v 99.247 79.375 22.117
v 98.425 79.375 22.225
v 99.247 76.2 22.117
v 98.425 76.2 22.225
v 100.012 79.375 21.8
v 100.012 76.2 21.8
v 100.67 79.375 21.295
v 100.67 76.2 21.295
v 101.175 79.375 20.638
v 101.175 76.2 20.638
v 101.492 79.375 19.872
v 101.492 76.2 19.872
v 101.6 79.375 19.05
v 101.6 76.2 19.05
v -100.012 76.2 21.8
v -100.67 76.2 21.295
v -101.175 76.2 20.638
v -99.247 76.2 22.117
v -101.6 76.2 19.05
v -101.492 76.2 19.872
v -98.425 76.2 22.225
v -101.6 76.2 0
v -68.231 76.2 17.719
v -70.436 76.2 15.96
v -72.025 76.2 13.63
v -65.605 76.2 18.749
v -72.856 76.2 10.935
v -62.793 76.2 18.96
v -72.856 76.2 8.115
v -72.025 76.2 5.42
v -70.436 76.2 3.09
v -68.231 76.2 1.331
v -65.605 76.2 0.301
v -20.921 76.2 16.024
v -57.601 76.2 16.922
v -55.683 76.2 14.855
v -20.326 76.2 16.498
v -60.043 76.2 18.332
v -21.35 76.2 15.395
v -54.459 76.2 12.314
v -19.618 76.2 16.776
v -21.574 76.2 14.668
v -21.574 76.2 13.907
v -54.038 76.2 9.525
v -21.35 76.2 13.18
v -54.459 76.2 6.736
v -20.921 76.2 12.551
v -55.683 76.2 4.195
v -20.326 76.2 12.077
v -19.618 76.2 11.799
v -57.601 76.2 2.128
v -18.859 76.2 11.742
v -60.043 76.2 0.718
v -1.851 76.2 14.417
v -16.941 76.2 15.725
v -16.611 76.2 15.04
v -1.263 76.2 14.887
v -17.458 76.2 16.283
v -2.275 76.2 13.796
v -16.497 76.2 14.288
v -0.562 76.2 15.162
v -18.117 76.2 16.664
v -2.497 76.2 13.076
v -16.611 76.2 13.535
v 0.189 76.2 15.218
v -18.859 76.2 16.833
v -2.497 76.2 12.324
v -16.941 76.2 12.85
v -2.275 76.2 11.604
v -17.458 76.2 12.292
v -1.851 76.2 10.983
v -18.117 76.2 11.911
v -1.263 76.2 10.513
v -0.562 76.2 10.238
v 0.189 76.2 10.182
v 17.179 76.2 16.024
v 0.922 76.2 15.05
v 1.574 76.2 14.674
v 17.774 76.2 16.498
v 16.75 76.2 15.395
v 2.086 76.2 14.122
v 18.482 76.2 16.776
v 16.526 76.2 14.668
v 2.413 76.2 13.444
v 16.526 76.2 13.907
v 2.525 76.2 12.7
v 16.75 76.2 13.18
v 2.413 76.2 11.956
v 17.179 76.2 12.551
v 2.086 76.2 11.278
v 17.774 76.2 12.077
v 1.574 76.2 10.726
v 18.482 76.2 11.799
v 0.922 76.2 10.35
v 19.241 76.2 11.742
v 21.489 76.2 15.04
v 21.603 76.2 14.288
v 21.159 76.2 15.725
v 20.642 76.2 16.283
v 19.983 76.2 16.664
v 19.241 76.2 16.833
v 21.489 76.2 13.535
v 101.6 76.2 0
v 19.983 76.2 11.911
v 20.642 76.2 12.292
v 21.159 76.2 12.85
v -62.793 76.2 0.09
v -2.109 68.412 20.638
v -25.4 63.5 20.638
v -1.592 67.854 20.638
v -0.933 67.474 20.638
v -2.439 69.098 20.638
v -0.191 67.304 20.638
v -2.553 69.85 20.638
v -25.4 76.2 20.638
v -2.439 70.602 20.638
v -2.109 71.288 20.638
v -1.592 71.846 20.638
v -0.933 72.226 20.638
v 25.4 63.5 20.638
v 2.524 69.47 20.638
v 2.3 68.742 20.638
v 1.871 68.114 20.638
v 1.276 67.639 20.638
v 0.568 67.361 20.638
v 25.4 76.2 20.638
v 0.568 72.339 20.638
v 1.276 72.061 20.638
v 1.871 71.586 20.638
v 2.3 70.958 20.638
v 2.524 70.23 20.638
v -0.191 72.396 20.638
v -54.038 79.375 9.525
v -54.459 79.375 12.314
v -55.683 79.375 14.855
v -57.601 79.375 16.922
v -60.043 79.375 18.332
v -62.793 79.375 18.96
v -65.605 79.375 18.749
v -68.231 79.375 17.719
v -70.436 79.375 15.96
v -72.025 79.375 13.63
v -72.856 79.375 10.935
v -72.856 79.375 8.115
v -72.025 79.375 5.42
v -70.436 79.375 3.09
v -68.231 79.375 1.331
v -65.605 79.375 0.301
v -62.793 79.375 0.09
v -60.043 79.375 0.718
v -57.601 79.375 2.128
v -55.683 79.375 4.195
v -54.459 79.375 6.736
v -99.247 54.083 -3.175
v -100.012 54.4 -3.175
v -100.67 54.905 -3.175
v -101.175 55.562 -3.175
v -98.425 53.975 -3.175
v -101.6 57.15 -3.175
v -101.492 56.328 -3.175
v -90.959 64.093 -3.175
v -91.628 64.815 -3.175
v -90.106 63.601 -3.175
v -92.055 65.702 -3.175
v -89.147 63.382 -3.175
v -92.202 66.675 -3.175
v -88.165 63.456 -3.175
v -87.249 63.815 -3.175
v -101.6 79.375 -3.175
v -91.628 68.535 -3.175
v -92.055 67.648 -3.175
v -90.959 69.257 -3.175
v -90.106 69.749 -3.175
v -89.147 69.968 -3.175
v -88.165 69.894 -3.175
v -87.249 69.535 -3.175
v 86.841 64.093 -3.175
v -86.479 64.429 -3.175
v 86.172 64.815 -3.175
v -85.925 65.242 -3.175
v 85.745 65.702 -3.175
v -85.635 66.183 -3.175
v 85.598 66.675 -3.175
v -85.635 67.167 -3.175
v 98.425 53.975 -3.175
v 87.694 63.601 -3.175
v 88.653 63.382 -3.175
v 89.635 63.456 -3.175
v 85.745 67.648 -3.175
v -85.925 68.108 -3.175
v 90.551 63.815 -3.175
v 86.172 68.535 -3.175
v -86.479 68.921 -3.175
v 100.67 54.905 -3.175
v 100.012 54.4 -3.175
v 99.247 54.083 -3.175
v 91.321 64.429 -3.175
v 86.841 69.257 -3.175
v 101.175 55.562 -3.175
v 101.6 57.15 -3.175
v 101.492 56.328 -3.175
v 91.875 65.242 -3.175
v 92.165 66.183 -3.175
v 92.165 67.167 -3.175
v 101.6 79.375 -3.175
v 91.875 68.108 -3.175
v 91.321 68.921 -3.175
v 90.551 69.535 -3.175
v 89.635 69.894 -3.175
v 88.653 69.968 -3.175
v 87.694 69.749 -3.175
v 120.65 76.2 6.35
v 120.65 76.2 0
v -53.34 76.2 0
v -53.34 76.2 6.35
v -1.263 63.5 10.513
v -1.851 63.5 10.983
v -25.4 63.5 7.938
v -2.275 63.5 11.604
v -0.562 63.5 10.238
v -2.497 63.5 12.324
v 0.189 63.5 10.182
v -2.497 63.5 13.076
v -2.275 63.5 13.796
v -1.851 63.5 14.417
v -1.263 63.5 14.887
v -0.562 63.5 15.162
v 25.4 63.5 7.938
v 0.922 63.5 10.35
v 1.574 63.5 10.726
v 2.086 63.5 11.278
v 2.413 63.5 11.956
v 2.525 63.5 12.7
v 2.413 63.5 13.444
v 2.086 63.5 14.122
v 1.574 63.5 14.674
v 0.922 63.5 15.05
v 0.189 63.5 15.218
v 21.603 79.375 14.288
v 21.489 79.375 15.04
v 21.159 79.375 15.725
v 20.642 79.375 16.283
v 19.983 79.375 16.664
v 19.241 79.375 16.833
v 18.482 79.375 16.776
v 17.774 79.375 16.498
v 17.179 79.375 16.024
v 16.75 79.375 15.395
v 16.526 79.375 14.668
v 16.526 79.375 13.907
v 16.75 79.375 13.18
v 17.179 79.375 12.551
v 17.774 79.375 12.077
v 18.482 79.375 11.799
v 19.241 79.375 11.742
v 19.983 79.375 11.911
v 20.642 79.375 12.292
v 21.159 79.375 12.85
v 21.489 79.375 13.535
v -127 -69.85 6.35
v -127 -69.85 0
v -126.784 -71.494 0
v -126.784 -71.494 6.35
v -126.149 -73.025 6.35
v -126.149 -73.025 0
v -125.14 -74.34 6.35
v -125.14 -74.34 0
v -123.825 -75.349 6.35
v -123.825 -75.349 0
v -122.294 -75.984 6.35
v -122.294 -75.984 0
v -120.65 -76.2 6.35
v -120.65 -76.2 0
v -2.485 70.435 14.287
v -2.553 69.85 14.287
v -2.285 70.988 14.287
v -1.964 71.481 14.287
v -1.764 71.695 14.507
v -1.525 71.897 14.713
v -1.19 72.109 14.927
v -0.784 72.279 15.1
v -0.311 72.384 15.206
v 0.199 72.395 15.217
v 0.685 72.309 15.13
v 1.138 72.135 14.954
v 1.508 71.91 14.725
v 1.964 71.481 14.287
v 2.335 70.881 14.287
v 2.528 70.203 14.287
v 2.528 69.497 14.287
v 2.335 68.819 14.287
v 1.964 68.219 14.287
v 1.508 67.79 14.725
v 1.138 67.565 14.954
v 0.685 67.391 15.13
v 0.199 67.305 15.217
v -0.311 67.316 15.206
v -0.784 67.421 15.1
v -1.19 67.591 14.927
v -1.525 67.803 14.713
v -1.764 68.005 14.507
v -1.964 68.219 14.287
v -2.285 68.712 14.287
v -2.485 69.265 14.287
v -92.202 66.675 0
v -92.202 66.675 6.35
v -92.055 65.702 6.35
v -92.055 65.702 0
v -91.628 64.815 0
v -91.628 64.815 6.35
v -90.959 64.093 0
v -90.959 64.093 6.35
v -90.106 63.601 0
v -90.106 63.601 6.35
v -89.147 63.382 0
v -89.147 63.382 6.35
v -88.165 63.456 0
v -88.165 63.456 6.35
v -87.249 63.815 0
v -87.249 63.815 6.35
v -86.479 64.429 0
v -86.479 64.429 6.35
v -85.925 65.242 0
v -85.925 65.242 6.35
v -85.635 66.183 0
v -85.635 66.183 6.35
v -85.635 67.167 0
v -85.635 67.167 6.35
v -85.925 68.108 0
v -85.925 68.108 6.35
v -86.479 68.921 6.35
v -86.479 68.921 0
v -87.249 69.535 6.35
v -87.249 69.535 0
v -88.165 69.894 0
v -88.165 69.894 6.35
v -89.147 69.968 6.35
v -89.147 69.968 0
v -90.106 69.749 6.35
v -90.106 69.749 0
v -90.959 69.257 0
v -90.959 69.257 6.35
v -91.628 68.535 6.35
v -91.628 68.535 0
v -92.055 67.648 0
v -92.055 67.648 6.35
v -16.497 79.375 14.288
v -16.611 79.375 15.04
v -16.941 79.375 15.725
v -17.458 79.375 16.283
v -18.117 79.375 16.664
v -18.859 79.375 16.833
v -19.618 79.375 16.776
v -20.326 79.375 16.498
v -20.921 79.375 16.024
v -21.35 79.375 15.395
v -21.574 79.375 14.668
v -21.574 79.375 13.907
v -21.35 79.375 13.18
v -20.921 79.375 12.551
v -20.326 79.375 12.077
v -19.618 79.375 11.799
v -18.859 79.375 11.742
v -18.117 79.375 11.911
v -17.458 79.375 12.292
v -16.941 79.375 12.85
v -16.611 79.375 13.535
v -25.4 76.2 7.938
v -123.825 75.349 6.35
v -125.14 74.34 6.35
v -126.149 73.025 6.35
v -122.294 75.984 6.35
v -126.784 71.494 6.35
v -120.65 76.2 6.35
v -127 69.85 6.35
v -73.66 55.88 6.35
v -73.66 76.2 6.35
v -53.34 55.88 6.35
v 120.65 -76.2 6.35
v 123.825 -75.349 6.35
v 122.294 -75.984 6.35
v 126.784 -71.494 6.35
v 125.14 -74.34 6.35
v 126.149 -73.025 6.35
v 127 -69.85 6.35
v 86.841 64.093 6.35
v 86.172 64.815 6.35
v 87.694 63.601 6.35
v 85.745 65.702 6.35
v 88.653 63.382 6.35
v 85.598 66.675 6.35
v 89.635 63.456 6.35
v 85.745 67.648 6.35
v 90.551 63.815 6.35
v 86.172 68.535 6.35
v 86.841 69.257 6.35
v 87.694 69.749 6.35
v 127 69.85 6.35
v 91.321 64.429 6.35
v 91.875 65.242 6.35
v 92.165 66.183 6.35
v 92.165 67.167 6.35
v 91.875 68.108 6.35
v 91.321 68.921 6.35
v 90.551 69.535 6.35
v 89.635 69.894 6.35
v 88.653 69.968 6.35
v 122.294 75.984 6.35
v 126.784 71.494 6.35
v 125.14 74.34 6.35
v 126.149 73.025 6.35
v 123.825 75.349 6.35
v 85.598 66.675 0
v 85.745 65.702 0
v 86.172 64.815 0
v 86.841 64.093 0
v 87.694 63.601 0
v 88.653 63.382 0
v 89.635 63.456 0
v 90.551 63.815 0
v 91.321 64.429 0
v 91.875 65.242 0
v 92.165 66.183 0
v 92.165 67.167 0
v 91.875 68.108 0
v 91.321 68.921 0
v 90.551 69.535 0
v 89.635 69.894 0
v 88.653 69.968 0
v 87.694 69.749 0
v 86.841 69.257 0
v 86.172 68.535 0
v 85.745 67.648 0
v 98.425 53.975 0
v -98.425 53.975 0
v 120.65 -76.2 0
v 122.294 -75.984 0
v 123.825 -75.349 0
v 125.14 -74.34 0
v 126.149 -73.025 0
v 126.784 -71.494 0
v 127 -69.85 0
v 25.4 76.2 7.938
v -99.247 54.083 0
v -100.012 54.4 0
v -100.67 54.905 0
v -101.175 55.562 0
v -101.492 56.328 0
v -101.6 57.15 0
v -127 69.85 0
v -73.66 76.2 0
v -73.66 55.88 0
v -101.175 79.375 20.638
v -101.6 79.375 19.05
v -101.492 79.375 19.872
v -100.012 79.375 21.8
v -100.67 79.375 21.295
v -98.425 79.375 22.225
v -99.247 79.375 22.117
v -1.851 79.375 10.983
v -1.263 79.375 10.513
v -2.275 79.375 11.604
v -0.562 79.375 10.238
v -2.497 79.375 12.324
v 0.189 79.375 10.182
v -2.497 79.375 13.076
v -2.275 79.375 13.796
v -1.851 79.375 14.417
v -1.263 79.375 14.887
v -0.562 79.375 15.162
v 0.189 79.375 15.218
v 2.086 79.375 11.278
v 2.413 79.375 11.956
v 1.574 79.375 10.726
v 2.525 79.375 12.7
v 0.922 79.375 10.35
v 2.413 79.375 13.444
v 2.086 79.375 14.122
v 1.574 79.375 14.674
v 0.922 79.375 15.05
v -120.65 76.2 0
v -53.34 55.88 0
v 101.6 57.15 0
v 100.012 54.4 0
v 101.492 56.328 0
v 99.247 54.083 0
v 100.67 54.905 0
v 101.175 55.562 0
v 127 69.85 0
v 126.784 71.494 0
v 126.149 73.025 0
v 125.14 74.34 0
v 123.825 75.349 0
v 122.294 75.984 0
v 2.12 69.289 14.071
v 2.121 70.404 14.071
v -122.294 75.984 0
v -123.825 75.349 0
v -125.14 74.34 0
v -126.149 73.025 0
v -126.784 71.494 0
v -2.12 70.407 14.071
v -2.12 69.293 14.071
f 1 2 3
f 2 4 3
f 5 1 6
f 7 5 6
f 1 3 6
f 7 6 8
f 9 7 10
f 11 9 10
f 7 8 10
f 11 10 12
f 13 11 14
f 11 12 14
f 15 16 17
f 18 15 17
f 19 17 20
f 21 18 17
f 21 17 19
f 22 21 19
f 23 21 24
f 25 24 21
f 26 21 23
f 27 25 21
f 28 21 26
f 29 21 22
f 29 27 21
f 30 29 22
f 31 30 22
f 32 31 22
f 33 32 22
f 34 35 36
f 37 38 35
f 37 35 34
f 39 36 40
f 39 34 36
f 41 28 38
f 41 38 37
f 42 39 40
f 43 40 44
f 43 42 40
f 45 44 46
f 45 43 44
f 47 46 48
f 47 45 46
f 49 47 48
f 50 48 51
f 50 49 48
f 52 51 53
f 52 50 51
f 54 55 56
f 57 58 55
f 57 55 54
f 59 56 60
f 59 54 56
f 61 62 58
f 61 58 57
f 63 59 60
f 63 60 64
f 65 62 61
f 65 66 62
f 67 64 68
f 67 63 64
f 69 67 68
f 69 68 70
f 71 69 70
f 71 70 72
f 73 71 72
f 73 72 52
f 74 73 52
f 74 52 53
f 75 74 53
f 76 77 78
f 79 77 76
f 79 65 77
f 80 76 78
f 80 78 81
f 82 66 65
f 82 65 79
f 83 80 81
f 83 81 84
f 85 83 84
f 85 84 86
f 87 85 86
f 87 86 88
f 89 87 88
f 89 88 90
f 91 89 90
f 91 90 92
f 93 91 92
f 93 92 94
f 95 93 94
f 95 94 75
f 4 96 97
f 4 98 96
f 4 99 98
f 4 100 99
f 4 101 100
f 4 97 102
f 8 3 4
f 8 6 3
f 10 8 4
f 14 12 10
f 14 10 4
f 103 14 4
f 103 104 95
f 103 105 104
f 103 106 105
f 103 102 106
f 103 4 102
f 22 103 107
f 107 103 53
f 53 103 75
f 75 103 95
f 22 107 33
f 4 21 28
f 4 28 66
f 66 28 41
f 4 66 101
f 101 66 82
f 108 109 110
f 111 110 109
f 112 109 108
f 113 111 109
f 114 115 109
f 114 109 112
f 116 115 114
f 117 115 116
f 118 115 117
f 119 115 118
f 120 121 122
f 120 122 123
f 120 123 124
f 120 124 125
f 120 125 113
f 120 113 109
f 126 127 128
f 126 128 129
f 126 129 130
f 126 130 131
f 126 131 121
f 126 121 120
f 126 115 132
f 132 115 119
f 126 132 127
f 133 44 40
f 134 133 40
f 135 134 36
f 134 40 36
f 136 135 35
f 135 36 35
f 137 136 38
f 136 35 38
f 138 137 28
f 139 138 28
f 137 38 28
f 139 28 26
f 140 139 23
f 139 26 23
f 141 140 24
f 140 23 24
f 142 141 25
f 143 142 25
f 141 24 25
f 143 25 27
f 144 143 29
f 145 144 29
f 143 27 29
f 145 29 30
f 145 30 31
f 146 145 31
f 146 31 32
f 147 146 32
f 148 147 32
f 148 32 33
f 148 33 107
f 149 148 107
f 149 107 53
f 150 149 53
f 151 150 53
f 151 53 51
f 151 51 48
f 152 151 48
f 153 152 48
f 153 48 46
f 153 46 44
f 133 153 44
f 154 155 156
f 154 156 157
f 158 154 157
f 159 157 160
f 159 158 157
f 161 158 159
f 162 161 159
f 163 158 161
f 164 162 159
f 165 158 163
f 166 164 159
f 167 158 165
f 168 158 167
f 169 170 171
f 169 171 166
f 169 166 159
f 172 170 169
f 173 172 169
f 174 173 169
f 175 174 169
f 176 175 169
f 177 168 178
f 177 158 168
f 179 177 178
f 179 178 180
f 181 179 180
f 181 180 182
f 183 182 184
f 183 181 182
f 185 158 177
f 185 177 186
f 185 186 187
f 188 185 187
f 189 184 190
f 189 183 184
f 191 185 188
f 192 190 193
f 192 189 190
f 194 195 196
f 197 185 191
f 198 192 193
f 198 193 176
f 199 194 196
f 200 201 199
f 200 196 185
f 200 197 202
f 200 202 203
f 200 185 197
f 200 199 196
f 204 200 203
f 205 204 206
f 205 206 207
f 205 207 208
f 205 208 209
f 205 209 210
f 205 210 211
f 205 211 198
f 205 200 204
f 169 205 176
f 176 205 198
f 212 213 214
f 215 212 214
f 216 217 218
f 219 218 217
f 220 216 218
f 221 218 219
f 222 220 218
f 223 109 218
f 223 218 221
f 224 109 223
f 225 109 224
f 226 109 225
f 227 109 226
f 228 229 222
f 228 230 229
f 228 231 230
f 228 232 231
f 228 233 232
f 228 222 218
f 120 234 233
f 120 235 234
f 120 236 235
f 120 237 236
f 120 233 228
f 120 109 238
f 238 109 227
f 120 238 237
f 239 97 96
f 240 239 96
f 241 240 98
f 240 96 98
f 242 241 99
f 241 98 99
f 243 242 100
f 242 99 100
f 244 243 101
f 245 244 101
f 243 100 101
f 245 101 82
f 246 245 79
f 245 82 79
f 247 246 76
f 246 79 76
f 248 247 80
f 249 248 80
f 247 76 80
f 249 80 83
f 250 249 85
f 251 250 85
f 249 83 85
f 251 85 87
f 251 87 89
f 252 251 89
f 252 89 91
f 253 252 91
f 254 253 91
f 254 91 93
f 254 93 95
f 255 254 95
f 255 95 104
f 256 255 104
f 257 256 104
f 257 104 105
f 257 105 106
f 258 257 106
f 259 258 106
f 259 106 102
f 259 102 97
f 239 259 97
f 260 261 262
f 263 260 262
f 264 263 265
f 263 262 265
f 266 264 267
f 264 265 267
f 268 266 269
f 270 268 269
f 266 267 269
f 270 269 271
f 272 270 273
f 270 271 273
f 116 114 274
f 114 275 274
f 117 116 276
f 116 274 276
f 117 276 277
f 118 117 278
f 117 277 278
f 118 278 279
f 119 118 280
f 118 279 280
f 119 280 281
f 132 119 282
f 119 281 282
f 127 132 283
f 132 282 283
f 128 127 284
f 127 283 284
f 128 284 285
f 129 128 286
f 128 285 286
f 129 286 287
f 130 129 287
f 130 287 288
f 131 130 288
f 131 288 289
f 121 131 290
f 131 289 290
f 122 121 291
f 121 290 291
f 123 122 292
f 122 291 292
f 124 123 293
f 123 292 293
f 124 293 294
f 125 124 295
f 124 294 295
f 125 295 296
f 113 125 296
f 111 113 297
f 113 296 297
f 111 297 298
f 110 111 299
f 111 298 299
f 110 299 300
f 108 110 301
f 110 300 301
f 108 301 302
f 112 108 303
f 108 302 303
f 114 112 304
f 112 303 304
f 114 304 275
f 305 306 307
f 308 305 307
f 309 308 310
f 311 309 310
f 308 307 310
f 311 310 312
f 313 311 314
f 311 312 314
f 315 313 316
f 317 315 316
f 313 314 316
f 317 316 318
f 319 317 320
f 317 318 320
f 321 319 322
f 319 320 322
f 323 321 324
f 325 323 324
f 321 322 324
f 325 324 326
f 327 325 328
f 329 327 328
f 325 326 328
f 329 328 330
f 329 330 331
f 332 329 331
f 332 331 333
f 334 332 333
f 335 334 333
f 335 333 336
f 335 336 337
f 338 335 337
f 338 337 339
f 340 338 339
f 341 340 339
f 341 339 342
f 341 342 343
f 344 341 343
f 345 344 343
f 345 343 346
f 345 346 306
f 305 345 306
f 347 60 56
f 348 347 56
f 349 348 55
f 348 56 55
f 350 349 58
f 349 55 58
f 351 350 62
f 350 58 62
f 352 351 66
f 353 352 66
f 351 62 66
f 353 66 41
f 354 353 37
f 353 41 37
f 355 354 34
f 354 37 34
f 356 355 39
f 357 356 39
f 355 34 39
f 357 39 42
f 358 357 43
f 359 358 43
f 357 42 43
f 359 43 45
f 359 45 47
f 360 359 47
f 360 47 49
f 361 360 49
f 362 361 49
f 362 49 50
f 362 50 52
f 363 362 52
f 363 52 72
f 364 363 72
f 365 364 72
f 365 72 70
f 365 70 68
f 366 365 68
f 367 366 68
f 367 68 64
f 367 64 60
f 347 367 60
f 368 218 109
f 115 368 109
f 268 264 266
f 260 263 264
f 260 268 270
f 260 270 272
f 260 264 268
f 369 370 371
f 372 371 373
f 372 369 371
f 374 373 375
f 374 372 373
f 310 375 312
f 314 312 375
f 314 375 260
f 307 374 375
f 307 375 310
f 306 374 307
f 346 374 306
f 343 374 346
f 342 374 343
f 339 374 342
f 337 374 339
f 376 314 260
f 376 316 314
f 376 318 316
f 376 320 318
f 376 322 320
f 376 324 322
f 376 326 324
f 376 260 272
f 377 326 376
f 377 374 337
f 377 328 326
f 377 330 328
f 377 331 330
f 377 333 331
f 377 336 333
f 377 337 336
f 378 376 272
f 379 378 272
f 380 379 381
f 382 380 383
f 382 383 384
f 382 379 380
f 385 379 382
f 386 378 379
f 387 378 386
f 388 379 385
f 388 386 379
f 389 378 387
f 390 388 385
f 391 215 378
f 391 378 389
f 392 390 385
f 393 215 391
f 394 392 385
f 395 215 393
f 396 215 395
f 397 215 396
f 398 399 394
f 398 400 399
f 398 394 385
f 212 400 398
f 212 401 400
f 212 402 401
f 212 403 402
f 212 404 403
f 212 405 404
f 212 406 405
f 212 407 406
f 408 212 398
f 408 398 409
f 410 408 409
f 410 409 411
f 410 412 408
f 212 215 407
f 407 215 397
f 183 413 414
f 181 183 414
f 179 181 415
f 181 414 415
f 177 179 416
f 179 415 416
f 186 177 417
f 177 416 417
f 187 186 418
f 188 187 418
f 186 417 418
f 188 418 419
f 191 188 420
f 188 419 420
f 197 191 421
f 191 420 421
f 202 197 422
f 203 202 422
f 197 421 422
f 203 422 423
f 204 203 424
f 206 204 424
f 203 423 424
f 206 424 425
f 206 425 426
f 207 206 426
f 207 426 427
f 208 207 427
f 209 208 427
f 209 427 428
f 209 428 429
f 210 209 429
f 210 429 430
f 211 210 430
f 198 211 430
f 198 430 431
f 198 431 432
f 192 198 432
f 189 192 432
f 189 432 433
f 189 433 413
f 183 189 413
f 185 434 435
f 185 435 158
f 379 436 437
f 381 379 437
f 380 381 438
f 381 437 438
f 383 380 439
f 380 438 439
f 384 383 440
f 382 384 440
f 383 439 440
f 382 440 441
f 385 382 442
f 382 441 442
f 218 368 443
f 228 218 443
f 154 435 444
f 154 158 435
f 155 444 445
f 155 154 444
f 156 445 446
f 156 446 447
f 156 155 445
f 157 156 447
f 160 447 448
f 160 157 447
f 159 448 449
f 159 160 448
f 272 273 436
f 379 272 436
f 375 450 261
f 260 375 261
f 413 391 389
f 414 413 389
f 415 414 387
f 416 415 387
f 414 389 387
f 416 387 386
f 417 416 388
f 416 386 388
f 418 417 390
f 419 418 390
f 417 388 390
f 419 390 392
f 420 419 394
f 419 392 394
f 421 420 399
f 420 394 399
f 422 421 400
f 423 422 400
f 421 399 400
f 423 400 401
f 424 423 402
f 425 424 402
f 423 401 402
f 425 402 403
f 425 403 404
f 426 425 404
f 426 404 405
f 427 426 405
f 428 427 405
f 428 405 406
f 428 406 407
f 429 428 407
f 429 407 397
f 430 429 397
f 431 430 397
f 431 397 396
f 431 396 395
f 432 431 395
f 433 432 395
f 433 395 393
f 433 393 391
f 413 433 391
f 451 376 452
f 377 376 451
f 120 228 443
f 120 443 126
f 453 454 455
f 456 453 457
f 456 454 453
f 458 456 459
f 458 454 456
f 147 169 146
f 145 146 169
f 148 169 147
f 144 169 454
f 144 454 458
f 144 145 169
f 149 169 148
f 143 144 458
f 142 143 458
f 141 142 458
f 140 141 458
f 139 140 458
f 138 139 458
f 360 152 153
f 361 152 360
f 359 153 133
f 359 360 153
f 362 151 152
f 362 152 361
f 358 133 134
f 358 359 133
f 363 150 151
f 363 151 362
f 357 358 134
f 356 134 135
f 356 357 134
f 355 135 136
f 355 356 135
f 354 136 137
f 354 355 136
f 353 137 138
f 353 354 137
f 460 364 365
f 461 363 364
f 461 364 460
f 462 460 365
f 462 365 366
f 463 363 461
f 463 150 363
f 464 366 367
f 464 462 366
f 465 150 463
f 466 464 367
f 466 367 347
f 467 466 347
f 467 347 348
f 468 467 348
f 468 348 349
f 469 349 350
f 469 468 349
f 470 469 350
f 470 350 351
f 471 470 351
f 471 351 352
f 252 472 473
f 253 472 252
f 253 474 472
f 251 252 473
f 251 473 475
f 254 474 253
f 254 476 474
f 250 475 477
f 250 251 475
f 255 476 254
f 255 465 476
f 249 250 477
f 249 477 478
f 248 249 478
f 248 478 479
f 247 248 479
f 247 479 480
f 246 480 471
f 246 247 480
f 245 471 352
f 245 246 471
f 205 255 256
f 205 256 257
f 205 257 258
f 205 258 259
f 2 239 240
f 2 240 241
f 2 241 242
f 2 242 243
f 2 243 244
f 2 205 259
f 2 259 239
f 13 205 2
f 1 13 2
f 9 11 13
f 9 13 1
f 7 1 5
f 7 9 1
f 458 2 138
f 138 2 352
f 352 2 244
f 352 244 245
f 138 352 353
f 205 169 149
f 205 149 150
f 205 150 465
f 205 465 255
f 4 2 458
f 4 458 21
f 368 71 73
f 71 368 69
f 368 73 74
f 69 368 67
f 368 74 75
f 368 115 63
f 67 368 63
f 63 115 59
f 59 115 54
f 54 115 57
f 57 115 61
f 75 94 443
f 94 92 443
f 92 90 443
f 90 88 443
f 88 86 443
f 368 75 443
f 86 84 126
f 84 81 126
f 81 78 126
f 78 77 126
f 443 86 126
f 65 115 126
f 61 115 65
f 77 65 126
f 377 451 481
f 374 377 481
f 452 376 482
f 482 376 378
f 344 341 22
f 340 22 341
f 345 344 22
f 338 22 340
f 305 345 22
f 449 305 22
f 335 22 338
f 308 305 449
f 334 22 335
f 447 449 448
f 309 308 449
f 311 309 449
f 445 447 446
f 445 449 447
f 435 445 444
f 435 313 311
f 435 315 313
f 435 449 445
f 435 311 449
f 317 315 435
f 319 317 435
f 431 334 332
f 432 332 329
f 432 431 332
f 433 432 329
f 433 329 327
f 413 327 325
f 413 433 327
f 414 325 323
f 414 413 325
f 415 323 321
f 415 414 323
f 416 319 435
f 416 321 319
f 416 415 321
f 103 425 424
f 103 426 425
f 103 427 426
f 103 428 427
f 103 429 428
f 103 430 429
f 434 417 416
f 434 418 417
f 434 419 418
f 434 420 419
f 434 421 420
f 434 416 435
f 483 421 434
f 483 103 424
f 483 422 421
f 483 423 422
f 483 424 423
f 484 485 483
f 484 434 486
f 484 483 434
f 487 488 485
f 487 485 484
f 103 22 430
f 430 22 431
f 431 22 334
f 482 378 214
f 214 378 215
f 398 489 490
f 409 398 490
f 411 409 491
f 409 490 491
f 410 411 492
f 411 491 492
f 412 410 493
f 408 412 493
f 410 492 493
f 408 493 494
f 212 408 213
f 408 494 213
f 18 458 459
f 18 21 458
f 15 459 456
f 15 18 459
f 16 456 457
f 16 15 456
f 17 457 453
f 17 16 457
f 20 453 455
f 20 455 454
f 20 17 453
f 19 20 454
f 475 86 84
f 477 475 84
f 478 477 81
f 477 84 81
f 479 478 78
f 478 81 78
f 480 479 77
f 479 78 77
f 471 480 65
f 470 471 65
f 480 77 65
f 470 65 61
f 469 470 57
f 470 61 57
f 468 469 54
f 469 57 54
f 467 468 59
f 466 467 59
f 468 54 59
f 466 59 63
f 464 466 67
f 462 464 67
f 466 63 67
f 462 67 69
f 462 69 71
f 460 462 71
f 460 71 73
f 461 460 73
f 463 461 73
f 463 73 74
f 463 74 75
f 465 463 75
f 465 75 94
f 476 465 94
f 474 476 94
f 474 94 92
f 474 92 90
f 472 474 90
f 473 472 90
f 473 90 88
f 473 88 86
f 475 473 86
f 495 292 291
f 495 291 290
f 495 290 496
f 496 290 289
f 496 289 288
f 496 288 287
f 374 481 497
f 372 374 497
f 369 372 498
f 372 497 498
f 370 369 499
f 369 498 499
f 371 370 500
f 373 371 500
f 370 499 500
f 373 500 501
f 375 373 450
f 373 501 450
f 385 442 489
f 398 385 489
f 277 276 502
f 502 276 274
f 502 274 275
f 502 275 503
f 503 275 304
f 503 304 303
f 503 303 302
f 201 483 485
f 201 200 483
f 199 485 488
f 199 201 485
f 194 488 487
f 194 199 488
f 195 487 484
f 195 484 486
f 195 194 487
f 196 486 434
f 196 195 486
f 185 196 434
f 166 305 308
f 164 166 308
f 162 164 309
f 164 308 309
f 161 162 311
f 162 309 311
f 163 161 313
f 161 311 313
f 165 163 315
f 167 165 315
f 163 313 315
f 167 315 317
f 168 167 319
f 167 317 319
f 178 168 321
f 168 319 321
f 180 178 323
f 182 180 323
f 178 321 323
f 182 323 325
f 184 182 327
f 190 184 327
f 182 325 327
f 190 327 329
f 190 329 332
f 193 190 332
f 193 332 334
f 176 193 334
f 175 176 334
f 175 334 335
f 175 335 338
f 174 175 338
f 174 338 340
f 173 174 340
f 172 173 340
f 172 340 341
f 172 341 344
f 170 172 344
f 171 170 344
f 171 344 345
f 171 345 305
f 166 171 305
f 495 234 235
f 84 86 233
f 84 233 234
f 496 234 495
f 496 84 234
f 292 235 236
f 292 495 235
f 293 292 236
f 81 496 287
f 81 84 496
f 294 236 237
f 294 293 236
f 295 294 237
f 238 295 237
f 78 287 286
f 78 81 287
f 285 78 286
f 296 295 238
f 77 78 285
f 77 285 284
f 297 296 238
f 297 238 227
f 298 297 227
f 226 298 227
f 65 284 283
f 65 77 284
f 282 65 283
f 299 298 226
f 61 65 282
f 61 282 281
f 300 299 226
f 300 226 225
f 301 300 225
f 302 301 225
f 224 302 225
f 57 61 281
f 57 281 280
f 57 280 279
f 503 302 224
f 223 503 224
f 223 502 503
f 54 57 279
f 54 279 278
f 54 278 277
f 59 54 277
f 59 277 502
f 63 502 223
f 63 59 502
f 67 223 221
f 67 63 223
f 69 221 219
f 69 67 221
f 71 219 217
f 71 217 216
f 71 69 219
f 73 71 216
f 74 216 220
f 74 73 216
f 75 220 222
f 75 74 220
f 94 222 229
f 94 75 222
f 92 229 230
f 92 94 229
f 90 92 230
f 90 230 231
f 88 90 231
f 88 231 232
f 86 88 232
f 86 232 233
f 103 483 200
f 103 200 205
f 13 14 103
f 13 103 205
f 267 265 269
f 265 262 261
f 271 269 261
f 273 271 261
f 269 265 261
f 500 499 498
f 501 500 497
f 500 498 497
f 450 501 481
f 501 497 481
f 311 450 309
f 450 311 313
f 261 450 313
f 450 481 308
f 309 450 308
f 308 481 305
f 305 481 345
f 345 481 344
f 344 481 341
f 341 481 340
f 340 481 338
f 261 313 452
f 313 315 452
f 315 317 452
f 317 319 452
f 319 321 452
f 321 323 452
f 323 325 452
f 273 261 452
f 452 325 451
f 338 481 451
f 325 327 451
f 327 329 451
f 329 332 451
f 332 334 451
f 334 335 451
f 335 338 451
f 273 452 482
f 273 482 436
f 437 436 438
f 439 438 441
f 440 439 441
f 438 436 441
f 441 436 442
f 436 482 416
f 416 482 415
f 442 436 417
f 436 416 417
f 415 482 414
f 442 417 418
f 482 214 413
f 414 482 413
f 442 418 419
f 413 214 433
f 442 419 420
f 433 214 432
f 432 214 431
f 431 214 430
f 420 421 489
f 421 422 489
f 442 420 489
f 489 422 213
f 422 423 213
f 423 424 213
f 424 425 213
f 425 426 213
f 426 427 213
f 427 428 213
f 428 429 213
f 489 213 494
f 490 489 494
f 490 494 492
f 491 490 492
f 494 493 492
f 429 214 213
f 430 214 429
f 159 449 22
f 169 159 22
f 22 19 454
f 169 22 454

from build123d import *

# Parameters (mm, degrees)
F1_DEPTH  = 6.35
F3_DEPTH  = 101.6
F4_R      = 3.175
F6_D      = 6.604
F6_2_D    = 6.604
F8_D      = 5.05
F9_W      = 50.8
F9_H      = 12.7
F9_R      = 2.525
F10_DEPTH = 12.7
F12_D     = 5.1054
F15_D     = 18.923
F16_D     = 5.1054
F16_DEPTH = 6.35
F16_TIP   = 1.5338169022
F17_W     = 20.32
F17_H     = 20.32
F18_DEPTH = 6.35


with BuildPart() as f1:
    # F0 (on Top) → F1 (new body)
    with BuildSketch(Plane.XY):
        with BuildLine():
            Line((120.65, 76.2), (-120.65, 76.2))
            ThreePointArc((-120.65, 76.2), (-125.1401280605, 74.3401280605), (-127, 69.85))
            Line((-127, 69.85), (-127, -69.85))
            ThreePointArc((-127, -69.85), (-125.1401280605, -74.3401280605), (-120.65, -76.2))
            Line((-120.65, -76.2), (120.65, -76.2))
            ThreePointArc((120.65, -76.2), (125.1401280605, -74.3401280605), (127, -69.85))
            Line((127, -69.85), (127, 69.85))
            ThreePointArc((127, 69.85), (125.1401280605, 74.3401280605), (120.65, 76.2))
        make_face()
    extrude(amount=F1_DEPTH)

    # F6 (through all)
    with Locations(Plane(origin=(0, 0, -3.175), x_dir=(1, 0, 0), z_dir=(0, 0, -1))):
        with Locations((-88.9, -66.675), (88.9, -66.675)):
            Hole(F6_D / 2)

    # F17 (on face) → F18 (cut, through all)
    with BuildSketch(Plane.XY.offset(6.35)):
        with Locations((-63.5, 66.04)):
            Rectangle(F17_W, F17_H)
    extrude(amount=-F18_DEPTH, mode=Mode.SUBTRACT)


with BuildPart() as f3:
    # F2 (on Right) → F3 (new body, symmetric)
    with BuildSketch(Plane.YZ):
        Polygon((76.2, 0), (53.975, 0), (53.975, -3.175), (79.375, -3.175), (79.375, 22.225), (76.2, 22.225), (76.2, 6.35), align=None)
    extrude(amount=F3_DEPTH, both=True)

    # F4
    f4_edges = [f3.edges().sort_by_distance(p)[0] for p in [
        (-101.6, 53.975, -1.5875),
        (101.6, 53.975, -1.5875),
        (101.6, 77.7875, 22.225),
        (-101.6, 77.7875, 22.225),
    ]]
    fillet(f4_edges, radius=F4_R)

    # F6#2 (through all)
    with Locations(Plane(origin=(0, 0, -3.175), x_dir=(1, 0, 0), z_dir=(0, 0, -1))):
        with Locations((-88.9, -66.675), (88.9, -66.675)):
            Hole(F6_2_D / 2)

    # F8 (through all)
    with Locations(Plane(origin=(0, 79.375, 0), x_dir=(-1, 0, 0), z_dir=(0, 1, 0))):
        with Locations((0, 12.7)):
            Hole(F8_D / 2)

    # F12 (through all)
    with Locations(Plane(origin=(0, 79.375, 0), x_dir=(-1, 0, 0), z_dir=(0, 1, 0))):
        with Locations((-19.05, 14.2875), (19.05, 14.2875)):
            Hole(F12_D / 2)

    # F15 (through all)
    with Locations(Plane(origin=(0, 79.375, 0), x_dir=(-1, 0, 0), z_dir=(0, 1, 0))):
        with Locations((63.5, 9.525)):
            Hole(F15_D / 2)


with BuildPart() as f10:
    # F9 (on face) → F10 (new body)
    with BuildSketch(Plane.XZ.offset(-76.2)):
        with Locations((0, 14.2875)):
            Rectangle(F9_W, F9_H)
        with Locations((0, 12.7)):
            Circle(F9_R, mode=Mode.SUBTRACT)
    extrude(amount=F10_DEPTH)

    # F16
    with Locations(Plane.XY.offset(20.6375)):
        with Locations((0, 69.85)):
            Hole(F16_D / 2, depth=F16_DEPTH)
            with Locations((0, 0, -(F16_DEPTH + F16_TIP / 2))):  # 118° drill point
                Cone(0, F16_D / 2, F16_TIP, mode=Mode.SUBTRACT)


solid = Compound([f1.part, f3.part, f10.part])
